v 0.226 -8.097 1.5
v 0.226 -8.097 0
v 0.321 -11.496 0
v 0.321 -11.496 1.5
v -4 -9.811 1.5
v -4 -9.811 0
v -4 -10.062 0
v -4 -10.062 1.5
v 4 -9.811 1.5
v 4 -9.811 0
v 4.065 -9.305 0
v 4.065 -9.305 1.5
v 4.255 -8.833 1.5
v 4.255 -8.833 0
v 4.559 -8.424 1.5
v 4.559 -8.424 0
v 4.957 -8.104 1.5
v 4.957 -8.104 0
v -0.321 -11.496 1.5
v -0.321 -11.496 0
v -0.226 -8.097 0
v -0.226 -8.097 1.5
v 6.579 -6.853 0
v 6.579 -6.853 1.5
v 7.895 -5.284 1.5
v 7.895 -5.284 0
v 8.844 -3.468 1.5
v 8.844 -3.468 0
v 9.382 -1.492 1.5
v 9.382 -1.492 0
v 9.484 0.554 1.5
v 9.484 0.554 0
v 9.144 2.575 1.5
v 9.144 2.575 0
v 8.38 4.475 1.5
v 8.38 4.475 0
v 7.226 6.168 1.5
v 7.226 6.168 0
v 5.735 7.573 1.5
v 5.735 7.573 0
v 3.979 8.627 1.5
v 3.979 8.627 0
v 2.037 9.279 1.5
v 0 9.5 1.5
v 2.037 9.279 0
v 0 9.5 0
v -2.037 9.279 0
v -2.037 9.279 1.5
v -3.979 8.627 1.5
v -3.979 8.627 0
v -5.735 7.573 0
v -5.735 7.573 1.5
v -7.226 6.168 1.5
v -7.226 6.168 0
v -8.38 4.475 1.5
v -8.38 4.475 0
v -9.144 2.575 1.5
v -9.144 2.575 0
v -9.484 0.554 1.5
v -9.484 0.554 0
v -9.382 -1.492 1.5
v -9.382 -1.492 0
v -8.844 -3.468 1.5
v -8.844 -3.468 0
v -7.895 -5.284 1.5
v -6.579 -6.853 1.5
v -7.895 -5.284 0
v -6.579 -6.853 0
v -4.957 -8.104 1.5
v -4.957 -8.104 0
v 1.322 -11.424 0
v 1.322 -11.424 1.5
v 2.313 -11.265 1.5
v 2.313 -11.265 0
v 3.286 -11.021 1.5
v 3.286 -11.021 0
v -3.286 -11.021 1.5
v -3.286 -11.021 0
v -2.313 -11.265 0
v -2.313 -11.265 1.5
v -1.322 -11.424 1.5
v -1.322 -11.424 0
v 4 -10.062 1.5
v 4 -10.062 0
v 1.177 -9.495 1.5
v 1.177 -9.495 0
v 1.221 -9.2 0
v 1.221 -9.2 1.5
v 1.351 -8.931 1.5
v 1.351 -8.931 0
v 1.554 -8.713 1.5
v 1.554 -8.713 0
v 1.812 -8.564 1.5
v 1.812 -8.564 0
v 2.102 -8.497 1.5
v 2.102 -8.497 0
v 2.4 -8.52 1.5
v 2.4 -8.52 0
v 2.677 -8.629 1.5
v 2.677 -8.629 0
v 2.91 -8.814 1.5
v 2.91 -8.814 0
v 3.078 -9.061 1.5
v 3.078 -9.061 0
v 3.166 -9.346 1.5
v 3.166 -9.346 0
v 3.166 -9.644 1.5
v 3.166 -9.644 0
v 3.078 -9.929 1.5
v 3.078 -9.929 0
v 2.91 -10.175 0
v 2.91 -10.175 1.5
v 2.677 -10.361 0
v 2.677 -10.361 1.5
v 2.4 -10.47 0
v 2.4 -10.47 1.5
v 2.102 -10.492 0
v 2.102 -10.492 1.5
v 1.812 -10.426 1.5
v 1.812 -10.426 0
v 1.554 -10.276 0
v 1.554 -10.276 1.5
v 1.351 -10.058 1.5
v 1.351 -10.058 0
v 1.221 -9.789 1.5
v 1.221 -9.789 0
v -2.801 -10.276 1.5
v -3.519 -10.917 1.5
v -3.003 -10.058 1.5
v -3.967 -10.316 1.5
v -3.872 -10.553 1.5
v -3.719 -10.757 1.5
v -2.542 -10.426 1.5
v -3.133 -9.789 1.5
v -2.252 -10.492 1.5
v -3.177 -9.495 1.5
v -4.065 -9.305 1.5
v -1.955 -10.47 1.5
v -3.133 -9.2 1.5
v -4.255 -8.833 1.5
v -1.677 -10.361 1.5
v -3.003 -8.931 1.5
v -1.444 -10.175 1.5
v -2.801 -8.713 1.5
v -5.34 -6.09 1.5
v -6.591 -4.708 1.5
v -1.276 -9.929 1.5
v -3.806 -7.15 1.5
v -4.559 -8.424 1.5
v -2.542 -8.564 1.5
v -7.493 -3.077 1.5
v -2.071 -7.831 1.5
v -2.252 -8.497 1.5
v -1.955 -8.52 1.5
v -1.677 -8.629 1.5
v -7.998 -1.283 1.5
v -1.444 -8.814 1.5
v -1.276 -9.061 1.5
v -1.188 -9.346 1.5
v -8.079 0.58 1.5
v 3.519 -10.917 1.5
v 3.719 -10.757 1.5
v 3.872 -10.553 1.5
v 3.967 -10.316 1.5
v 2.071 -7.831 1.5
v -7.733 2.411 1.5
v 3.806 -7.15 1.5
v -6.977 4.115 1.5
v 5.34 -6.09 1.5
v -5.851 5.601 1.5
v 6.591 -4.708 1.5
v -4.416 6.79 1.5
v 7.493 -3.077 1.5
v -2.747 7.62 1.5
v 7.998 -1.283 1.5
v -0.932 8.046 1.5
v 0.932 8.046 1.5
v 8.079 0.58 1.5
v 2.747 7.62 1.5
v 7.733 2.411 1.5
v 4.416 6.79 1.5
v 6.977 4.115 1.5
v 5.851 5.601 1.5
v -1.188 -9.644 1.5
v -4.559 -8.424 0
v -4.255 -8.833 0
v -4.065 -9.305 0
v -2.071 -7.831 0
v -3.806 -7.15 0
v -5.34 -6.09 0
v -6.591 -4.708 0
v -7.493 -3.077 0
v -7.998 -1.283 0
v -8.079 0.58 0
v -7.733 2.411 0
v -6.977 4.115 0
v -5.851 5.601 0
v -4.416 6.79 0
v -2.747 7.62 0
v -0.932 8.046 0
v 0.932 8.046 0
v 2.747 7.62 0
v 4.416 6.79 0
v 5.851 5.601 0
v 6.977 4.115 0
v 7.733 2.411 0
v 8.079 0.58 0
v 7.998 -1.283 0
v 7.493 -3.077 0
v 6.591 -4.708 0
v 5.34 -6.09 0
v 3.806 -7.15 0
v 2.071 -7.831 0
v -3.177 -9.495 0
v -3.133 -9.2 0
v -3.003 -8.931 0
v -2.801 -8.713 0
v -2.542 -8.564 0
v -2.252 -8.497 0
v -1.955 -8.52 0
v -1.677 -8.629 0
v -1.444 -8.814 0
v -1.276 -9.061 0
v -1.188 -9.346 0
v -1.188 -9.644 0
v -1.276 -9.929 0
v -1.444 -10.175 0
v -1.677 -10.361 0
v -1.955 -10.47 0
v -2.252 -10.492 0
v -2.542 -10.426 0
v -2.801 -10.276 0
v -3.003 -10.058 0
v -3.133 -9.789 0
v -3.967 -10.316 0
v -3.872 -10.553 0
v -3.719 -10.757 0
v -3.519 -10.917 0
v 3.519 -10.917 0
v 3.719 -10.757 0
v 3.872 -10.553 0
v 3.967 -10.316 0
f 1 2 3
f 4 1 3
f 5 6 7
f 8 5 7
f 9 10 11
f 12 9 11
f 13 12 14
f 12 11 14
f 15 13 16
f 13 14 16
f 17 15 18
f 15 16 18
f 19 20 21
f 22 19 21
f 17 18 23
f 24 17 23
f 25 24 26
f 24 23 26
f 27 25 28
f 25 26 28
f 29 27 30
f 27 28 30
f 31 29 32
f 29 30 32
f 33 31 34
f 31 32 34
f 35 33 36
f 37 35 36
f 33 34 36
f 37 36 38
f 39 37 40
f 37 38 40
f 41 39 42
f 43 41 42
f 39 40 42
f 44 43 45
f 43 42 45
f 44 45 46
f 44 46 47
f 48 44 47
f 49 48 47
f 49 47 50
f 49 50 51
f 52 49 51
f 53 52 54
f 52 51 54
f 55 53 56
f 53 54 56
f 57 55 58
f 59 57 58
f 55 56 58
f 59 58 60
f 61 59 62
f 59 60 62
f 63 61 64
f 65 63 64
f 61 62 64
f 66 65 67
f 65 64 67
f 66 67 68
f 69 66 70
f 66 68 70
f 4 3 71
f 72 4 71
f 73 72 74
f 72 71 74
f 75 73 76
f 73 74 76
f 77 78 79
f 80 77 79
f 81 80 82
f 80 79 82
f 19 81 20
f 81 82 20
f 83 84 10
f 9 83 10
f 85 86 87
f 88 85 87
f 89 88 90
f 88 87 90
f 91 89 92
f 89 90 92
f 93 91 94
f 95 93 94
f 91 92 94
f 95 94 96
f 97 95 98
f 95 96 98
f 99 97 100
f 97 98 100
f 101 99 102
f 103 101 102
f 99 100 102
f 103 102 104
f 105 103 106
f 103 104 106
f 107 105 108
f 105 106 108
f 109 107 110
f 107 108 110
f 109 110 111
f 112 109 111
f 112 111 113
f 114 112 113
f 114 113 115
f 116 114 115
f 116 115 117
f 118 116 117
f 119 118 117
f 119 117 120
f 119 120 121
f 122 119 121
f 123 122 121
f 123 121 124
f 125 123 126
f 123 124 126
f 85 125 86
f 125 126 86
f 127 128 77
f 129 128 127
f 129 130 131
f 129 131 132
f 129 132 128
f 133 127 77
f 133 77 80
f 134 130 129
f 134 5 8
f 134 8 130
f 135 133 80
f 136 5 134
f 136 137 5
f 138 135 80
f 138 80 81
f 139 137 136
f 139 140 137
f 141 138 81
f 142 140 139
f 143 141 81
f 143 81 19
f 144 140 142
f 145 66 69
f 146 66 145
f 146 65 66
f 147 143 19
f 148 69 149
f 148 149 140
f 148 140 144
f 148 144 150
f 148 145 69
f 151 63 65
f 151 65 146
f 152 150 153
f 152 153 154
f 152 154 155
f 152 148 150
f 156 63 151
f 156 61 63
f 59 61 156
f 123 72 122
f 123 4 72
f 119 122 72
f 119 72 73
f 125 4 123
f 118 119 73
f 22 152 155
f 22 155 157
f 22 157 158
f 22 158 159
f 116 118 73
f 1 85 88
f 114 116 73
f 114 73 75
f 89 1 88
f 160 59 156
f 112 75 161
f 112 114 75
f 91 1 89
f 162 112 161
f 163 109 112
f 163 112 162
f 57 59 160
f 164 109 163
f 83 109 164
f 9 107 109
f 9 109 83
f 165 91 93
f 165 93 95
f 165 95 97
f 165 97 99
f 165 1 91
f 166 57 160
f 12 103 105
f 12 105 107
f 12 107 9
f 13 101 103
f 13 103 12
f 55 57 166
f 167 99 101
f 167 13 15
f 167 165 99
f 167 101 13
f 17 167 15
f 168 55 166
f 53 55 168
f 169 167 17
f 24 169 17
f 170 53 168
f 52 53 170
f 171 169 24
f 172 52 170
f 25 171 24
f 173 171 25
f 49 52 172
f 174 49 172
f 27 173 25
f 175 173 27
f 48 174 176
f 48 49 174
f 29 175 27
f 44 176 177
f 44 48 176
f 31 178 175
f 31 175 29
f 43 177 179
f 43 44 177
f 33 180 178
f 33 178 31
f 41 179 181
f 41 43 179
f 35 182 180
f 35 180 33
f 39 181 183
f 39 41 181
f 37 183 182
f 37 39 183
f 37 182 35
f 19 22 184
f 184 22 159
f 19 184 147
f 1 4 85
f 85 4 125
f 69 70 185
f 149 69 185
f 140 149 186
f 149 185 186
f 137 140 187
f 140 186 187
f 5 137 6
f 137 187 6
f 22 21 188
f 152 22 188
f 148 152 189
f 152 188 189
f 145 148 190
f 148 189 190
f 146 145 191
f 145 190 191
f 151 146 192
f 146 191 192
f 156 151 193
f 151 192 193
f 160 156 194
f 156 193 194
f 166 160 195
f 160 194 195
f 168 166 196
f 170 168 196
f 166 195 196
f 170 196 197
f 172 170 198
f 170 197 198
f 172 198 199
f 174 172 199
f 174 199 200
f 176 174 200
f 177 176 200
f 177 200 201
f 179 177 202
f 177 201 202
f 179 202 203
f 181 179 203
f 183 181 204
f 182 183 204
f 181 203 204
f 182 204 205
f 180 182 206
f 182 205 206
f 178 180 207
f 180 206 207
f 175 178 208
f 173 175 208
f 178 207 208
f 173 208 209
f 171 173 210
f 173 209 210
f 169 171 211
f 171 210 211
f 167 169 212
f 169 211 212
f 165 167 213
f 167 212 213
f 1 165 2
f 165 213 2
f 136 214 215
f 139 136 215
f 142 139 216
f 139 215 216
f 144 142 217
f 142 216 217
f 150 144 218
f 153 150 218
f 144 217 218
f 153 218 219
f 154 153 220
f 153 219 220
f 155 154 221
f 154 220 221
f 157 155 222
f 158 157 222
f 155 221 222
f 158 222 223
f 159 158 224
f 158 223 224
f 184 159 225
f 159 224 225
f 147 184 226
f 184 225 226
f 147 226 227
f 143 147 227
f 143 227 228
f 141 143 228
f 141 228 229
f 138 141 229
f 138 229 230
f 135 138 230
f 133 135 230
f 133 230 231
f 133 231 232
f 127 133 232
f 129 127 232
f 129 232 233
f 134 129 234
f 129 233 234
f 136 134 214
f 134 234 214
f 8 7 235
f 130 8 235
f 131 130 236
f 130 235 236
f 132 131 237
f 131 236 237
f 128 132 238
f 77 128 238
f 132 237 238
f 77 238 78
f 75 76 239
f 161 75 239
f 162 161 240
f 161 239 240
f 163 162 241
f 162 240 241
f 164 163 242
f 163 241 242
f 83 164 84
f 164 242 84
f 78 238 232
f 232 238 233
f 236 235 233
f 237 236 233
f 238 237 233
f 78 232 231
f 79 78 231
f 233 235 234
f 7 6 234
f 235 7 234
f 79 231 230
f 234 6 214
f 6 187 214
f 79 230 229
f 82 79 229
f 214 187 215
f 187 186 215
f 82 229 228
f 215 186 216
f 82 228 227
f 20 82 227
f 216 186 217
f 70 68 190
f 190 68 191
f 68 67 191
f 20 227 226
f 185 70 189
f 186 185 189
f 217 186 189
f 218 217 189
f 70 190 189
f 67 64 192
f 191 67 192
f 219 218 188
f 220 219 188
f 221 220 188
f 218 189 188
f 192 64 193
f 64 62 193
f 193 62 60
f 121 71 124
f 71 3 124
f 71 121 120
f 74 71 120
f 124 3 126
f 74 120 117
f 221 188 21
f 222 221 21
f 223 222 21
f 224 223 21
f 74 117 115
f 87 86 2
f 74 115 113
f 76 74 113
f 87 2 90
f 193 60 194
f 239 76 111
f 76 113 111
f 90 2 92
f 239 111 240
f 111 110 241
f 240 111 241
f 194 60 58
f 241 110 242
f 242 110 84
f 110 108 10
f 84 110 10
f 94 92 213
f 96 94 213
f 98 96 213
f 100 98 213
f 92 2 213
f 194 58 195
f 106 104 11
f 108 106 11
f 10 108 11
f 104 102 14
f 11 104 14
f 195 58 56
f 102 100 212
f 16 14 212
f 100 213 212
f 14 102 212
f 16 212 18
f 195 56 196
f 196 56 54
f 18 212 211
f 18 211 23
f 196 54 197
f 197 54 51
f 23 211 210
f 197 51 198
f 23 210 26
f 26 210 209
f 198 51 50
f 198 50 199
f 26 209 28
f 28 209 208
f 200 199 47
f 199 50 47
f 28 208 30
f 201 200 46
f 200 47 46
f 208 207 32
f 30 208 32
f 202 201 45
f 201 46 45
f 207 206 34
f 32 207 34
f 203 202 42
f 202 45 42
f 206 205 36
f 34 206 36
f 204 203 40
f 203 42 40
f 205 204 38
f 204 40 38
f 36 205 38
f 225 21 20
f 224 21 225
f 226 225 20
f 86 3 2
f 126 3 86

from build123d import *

# Parameters (mm, degrees)
EXTRUDE_1_DEPTH     = 1.5
SKETCH_2_R          = 1
CUT_EXTRUDE_1_DEPTH = 1.5


with BuildPart() as part:
    # Эскиз1 → Бобышка-Вытянуть1 (new body)
    with BuildSketch(Plane.XY):
        with BuildLine():
            Line((-0.321098845, -11.495516323), (-0.226165274, -8.096841932))
            ThreePointArc((-0.226165274, -8.096841932), (0, 8.1), (0.226165274, -8.096841932))
            Line((0.226165274, -8.096841932), (0.321098845, -11.495516323))
            ThreePointArc((0.321098845, -11.495516323), (1.818971328, -11.355234181), (3.285714286, -11.020620746))
            ThreePointArc((3.285714286, -11.020620746), (3.801783726, -10.659920203), (4, -10.062305899))
            Line((4, -10.062305899), (4, -9.810708435))
            ThreePointArc((4, -9.810708435), (4.255443248, -8.832689141), (4.956521739, -8.104498273))
            ThreePointArc((4.956521739, -8.104498273), (0, 9.5), (-4.956521739, -8.104498273))
            ThreePointArc((-4.956521739, -8.104498273), (-4.255443248, -8.832689141), (-4, -9.810708435))
            Line((-4, -9.810708435), (-4, -10.062305899))
            ThreePointArc((-4, -10.062305899), (-3.801783726, -10.659920203), (-3.285714286, -11.020620746))
            ThreePointArc((-3.285714286, -11.020620746), (-1.818971328, -11.355234181), (-0.321098845, -11.495516323))
        make_face()
    extrude(amount=EXTRUDE_1_DEPTH)

    # Эскиз2 → Вырез-Вытянуть1 (cut)
    with BuildSketch(Plane(origin=(0, 0, 0), x_dir=(-1, 0, 0), z_dir=(0, 0, -1))):
        with Locations((-2.177047903, -9.494628436)):
            Circle(SKETCH_2_R)
        with Locations((2.177047903, -9.494628436)):
            Circle(SKETCH_2_R)
    extrude(amount=-CUT_EXTRUDE_1_DEPTH, mode=Mode.SUBTRACT)


solid = part.part
